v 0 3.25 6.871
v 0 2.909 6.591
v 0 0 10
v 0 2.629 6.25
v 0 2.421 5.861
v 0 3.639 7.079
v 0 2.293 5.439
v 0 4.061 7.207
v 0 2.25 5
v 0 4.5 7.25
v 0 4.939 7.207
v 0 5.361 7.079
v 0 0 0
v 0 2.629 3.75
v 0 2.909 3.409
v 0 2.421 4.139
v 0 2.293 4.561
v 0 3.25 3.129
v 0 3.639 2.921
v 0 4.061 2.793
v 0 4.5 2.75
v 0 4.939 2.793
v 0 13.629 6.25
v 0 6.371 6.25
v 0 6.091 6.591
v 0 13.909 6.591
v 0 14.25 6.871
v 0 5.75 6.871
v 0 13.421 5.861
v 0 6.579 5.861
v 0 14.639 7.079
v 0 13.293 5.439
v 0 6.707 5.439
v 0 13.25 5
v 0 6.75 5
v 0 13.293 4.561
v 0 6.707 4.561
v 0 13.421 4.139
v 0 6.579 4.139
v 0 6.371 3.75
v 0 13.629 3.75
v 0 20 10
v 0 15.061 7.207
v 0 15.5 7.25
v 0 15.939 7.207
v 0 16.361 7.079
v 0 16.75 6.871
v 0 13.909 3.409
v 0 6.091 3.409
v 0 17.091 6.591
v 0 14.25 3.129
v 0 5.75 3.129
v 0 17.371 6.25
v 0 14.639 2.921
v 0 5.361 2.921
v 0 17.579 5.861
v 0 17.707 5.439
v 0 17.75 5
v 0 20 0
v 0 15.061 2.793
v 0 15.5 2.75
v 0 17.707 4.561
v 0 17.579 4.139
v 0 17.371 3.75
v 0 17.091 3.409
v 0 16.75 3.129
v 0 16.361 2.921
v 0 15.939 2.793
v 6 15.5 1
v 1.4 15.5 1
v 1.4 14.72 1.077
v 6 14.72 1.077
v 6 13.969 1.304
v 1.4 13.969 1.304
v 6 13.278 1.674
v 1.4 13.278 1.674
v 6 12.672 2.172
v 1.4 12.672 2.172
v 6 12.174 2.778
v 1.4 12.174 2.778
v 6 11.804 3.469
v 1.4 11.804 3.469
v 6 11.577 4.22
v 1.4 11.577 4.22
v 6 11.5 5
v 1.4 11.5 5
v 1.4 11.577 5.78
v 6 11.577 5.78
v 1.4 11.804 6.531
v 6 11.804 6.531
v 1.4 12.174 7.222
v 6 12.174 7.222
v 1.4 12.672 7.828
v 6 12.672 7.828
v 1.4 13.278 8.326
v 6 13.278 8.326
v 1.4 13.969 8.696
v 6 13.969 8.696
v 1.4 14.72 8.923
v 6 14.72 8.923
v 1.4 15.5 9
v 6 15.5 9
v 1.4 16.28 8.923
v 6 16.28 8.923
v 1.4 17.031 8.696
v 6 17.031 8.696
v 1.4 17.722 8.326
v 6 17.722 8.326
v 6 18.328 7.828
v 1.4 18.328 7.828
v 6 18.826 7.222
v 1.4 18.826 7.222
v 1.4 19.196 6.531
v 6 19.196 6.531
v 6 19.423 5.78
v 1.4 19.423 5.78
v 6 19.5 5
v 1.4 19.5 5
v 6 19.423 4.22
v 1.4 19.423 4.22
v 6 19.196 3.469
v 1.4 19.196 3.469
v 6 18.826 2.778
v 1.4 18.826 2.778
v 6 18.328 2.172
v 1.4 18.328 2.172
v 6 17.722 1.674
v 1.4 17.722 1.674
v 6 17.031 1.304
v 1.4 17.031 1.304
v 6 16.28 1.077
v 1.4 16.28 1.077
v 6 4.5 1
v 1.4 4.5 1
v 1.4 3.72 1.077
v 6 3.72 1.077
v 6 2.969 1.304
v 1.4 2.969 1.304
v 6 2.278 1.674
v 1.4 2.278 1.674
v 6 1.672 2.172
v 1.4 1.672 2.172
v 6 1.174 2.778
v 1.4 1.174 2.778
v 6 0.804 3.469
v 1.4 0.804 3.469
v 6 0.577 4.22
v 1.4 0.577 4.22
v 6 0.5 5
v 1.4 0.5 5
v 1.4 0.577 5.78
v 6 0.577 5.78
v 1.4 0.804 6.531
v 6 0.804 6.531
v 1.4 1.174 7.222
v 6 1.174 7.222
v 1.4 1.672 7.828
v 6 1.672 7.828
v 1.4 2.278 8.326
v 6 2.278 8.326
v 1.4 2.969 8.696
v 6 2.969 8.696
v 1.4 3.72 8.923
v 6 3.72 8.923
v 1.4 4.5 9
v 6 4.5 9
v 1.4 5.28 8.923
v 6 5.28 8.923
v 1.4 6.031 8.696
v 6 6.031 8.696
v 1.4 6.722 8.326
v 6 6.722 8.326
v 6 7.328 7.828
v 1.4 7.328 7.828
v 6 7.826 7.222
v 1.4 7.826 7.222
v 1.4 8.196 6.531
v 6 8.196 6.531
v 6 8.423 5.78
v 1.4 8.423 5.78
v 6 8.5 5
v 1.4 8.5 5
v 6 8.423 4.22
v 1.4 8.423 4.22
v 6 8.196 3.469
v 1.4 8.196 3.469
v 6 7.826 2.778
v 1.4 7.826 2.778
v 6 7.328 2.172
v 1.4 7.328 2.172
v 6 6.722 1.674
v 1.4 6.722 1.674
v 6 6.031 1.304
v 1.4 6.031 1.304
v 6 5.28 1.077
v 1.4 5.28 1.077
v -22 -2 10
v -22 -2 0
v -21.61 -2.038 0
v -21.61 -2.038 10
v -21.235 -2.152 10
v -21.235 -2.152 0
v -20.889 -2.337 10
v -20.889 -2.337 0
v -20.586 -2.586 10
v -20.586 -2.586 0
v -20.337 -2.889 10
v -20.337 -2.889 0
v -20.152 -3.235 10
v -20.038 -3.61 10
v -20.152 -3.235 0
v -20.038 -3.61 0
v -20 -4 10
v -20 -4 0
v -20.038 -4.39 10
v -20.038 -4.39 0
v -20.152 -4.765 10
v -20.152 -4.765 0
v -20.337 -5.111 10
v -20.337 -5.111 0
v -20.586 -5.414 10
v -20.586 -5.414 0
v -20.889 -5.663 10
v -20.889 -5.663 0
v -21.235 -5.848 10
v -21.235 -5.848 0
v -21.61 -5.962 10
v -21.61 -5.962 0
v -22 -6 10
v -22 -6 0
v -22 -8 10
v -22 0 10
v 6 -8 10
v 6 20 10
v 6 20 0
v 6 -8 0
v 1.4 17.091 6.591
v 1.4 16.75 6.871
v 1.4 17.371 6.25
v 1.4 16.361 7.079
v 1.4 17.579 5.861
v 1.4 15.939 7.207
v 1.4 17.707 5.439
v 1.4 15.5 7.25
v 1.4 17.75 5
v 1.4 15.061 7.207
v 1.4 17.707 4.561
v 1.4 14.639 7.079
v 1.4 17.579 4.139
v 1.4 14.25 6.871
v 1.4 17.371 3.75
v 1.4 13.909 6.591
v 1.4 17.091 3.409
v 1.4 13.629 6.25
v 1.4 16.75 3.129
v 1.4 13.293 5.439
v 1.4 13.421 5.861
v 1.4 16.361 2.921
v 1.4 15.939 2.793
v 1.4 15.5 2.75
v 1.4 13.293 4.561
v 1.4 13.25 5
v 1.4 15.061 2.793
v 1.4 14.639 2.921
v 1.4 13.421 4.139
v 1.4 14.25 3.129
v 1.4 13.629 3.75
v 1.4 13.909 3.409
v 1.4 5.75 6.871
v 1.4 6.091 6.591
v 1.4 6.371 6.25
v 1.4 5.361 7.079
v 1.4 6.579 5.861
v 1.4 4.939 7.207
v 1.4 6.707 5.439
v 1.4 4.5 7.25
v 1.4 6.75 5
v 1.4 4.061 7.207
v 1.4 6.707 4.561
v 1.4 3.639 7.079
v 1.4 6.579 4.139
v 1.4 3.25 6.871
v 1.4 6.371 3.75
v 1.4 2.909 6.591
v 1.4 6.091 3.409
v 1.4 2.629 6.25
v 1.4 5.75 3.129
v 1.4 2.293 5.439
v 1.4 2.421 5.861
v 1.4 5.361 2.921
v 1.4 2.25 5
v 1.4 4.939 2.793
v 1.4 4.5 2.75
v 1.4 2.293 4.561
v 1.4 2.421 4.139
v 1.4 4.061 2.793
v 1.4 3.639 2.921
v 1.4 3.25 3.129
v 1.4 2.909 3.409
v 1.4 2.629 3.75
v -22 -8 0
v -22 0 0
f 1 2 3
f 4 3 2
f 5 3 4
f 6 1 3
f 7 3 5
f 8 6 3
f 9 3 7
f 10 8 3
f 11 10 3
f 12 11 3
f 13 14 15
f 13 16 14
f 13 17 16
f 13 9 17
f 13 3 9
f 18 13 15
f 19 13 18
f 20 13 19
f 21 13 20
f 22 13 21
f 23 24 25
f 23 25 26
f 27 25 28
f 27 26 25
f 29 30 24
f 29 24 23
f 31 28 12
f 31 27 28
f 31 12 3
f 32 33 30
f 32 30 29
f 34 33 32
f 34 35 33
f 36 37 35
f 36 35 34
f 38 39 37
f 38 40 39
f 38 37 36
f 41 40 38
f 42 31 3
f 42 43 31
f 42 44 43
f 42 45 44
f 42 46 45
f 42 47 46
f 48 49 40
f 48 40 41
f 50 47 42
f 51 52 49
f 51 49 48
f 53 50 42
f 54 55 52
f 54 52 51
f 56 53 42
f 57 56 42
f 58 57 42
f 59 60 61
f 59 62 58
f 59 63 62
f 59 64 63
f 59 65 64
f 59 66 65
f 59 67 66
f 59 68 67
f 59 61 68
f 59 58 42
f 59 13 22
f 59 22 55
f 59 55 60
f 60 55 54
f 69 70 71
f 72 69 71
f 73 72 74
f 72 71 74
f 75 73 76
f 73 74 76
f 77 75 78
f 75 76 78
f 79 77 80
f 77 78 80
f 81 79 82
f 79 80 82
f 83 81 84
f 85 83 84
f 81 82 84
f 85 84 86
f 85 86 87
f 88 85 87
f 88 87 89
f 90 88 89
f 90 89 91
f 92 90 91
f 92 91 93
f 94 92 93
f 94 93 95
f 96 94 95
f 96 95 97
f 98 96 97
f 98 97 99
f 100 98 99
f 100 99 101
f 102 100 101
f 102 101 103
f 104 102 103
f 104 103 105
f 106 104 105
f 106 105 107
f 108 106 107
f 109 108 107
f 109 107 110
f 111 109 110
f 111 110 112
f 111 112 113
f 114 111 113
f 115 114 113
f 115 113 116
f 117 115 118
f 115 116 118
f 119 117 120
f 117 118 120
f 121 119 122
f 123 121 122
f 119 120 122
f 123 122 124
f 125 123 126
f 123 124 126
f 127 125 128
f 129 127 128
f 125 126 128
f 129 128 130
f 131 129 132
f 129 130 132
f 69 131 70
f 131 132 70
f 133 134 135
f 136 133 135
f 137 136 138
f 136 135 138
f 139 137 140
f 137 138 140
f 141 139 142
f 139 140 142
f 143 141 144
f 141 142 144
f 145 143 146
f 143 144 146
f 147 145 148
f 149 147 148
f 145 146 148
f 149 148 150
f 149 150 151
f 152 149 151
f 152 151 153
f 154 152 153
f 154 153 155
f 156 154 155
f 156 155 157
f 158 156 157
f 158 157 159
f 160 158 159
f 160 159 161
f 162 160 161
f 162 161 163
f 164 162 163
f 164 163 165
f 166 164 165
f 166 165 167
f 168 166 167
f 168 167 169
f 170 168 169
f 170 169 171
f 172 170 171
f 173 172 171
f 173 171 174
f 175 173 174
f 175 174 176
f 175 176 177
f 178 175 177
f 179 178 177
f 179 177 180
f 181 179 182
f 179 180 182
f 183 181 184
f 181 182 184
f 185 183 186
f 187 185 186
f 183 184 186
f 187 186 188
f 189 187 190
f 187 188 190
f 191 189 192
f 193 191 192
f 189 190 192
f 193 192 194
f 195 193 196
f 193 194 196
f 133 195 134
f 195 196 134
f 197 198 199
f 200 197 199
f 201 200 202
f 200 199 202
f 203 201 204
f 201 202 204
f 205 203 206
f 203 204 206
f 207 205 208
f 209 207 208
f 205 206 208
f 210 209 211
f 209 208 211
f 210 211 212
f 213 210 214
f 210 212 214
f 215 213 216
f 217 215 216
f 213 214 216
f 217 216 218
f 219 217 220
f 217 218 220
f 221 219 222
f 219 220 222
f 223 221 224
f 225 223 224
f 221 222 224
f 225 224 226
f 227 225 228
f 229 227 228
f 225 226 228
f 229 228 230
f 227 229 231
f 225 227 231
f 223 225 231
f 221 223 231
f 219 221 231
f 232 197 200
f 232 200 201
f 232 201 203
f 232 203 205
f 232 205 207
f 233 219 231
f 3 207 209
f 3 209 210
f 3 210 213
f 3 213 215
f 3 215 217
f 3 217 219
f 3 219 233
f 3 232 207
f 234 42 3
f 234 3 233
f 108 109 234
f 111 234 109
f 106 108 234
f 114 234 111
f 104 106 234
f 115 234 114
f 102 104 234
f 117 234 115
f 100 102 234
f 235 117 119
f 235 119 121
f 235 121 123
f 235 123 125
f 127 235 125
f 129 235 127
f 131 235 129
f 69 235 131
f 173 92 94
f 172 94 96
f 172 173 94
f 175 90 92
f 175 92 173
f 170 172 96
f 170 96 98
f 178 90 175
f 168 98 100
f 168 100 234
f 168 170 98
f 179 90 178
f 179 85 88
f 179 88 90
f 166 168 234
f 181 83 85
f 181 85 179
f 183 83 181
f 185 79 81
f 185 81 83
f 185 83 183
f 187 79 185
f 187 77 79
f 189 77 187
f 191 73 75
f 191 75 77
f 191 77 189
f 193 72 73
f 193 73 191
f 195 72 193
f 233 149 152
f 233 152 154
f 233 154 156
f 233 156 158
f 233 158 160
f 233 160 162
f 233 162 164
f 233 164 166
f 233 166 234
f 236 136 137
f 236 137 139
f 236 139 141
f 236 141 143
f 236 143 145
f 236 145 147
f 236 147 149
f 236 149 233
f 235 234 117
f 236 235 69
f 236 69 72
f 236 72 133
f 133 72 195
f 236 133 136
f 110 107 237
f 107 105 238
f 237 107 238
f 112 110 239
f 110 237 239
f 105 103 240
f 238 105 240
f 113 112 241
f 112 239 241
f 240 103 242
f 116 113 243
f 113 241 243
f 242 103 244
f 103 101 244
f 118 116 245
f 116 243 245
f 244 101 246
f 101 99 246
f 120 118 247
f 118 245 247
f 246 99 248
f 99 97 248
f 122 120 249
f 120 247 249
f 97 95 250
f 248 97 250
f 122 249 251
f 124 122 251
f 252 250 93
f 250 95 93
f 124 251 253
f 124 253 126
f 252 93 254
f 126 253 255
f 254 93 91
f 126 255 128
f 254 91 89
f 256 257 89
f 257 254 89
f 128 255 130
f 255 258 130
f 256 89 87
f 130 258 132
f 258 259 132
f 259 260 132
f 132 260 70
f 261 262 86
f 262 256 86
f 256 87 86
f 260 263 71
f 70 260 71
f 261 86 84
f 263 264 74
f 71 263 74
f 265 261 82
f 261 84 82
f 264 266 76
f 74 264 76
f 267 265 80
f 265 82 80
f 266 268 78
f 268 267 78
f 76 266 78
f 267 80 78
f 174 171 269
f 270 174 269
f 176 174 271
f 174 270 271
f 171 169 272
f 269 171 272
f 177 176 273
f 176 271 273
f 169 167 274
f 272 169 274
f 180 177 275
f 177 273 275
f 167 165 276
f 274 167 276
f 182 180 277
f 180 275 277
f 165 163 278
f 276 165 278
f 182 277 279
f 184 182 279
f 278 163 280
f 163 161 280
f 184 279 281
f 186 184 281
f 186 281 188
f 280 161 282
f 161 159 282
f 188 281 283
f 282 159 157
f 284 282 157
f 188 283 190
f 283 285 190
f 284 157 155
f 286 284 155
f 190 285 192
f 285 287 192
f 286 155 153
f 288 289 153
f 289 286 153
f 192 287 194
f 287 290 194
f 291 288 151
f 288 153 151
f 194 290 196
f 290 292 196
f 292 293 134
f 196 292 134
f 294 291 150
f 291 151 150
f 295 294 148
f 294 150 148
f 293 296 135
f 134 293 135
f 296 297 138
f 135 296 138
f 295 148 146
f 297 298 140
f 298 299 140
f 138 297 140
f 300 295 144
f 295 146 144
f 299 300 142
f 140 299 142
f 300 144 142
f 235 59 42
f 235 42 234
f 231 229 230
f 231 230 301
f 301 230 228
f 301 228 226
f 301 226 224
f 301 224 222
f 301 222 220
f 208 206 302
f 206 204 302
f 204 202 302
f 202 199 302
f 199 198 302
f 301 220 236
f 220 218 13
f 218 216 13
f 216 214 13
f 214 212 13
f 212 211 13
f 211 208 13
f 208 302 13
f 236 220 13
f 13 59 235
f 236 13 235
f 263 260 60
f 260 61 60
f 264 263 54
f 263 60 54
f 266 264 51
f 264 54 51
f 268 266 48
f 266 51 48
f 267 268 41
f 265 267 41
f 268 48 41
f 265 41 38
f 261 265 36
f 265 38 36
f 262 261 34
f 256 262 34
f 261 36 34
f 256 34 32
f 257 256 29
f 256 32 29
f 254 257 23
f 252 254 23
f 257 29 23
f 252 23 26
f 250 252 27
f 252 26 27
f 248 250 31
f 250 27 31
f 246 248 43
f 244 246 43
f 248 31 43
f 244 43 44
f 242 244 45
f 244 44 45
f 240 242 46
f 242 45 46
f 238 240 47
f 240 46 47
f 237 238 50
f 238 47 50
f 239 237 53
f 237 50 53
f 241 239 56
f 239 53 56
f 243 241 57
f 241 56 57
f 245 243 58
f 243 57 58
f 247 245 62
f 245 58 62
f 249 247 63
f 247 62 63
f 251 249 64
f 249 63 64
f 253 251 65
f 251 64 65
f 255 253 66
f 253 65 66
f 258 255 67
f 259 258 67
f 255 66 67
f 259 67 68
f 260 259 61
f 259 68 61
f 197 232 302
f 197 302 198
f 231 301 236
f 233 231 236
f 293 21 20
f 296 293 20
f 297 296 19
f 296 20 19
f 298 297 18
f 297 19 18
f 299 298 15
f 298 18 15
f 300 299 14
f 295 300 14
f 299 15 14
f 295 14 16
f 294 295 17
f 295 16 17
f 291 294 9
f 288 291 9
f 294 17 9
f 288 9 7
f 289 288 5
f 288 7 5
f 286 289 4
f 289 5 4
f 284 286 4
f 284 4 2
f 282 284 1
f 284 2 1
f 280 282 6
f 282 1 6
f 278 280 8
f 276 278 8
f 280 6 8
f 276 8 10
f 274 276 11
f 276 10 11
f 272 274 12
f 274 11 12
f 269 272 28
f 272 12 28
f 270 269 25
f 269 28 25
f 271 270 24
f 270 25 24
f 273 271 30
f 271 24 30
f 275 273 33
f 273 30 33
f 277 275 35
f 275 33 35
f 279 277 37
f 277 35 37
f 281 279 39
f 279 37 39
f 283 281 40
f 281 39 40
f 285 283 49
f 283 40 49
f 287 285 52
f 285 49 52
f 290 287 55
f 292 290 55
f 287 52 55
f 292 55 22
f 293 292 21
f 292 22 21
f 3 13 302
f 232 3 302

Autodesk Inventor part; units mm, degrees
ref_plane "YZ Plane" through (0, 0, 0) normal (1, 0, 0) x (0, 1, 0)
ref_plane "XZ Plane" through (0, 0, 0) normal (0, 1, 0) x (-1, 0, 0)
ref_plane "XY Plane" through (0, 0, 0) normal (0, 0, 1) x (1, 0, 0)
sketch "Sketch1" plane through (0, 0, 0) normal (0, 0, 1) x (1, 0, 0)
  line L0 (0, 20) -> (6, 20)
  line L1 (6, 20) -> (6, 0)
  line L2 (6, 0) -> (0, 0)
  line L3 (0, 0) -> (0, 20)
  line L4 (6, 0) -> (-22, 0)
  line L5 (-22, 0) -> (-22, -8)
  line L6 (-22, -8) -> (6, -8)
  line L7 (6, -8) -> (6, 0)
  circle A0 centre (-22, -4) radius 2
  point P0 (0, 0)
  point P1 (-22, -2)
  point P2 (-22, -6)
  dimension "d0" = 20
  dimension "d1" = 6
  dimension "d2" = 4
  dimension "d3" = 8
  dimension "d4" = 22
extrude "Extrusion1" add sketch "Sketch1" along normal blind 10 contours L0 L1 L2 L3 | L2 L7 L6 L5 A0 L4
sketch "Sketch2" plane through (6, -8, 0) normal (1, 0, 0) x (0, 0, -1)
  line L0 (0, 28) -> (-10, 28) projected
  point P0 (0, 8)
  point P1 (-5, 12.5)
  point P2 (-5, 23.5)
  point P3 (-5, 28)
  dimension "d14" = 11
  dimension "d15" = 4.5
hole "Hole1" at (6, 15.5, 5) at (6, 4.5, 5) direction (-1, 0, 0) diameter 4.5 end through all counterbore diameter 8 counterbore depth 4.6 clearance for "Socket Head Cap Screw ISO 4762" size "M4" standard "ISO"
properties part number "Gripper arm" material "Steel"
